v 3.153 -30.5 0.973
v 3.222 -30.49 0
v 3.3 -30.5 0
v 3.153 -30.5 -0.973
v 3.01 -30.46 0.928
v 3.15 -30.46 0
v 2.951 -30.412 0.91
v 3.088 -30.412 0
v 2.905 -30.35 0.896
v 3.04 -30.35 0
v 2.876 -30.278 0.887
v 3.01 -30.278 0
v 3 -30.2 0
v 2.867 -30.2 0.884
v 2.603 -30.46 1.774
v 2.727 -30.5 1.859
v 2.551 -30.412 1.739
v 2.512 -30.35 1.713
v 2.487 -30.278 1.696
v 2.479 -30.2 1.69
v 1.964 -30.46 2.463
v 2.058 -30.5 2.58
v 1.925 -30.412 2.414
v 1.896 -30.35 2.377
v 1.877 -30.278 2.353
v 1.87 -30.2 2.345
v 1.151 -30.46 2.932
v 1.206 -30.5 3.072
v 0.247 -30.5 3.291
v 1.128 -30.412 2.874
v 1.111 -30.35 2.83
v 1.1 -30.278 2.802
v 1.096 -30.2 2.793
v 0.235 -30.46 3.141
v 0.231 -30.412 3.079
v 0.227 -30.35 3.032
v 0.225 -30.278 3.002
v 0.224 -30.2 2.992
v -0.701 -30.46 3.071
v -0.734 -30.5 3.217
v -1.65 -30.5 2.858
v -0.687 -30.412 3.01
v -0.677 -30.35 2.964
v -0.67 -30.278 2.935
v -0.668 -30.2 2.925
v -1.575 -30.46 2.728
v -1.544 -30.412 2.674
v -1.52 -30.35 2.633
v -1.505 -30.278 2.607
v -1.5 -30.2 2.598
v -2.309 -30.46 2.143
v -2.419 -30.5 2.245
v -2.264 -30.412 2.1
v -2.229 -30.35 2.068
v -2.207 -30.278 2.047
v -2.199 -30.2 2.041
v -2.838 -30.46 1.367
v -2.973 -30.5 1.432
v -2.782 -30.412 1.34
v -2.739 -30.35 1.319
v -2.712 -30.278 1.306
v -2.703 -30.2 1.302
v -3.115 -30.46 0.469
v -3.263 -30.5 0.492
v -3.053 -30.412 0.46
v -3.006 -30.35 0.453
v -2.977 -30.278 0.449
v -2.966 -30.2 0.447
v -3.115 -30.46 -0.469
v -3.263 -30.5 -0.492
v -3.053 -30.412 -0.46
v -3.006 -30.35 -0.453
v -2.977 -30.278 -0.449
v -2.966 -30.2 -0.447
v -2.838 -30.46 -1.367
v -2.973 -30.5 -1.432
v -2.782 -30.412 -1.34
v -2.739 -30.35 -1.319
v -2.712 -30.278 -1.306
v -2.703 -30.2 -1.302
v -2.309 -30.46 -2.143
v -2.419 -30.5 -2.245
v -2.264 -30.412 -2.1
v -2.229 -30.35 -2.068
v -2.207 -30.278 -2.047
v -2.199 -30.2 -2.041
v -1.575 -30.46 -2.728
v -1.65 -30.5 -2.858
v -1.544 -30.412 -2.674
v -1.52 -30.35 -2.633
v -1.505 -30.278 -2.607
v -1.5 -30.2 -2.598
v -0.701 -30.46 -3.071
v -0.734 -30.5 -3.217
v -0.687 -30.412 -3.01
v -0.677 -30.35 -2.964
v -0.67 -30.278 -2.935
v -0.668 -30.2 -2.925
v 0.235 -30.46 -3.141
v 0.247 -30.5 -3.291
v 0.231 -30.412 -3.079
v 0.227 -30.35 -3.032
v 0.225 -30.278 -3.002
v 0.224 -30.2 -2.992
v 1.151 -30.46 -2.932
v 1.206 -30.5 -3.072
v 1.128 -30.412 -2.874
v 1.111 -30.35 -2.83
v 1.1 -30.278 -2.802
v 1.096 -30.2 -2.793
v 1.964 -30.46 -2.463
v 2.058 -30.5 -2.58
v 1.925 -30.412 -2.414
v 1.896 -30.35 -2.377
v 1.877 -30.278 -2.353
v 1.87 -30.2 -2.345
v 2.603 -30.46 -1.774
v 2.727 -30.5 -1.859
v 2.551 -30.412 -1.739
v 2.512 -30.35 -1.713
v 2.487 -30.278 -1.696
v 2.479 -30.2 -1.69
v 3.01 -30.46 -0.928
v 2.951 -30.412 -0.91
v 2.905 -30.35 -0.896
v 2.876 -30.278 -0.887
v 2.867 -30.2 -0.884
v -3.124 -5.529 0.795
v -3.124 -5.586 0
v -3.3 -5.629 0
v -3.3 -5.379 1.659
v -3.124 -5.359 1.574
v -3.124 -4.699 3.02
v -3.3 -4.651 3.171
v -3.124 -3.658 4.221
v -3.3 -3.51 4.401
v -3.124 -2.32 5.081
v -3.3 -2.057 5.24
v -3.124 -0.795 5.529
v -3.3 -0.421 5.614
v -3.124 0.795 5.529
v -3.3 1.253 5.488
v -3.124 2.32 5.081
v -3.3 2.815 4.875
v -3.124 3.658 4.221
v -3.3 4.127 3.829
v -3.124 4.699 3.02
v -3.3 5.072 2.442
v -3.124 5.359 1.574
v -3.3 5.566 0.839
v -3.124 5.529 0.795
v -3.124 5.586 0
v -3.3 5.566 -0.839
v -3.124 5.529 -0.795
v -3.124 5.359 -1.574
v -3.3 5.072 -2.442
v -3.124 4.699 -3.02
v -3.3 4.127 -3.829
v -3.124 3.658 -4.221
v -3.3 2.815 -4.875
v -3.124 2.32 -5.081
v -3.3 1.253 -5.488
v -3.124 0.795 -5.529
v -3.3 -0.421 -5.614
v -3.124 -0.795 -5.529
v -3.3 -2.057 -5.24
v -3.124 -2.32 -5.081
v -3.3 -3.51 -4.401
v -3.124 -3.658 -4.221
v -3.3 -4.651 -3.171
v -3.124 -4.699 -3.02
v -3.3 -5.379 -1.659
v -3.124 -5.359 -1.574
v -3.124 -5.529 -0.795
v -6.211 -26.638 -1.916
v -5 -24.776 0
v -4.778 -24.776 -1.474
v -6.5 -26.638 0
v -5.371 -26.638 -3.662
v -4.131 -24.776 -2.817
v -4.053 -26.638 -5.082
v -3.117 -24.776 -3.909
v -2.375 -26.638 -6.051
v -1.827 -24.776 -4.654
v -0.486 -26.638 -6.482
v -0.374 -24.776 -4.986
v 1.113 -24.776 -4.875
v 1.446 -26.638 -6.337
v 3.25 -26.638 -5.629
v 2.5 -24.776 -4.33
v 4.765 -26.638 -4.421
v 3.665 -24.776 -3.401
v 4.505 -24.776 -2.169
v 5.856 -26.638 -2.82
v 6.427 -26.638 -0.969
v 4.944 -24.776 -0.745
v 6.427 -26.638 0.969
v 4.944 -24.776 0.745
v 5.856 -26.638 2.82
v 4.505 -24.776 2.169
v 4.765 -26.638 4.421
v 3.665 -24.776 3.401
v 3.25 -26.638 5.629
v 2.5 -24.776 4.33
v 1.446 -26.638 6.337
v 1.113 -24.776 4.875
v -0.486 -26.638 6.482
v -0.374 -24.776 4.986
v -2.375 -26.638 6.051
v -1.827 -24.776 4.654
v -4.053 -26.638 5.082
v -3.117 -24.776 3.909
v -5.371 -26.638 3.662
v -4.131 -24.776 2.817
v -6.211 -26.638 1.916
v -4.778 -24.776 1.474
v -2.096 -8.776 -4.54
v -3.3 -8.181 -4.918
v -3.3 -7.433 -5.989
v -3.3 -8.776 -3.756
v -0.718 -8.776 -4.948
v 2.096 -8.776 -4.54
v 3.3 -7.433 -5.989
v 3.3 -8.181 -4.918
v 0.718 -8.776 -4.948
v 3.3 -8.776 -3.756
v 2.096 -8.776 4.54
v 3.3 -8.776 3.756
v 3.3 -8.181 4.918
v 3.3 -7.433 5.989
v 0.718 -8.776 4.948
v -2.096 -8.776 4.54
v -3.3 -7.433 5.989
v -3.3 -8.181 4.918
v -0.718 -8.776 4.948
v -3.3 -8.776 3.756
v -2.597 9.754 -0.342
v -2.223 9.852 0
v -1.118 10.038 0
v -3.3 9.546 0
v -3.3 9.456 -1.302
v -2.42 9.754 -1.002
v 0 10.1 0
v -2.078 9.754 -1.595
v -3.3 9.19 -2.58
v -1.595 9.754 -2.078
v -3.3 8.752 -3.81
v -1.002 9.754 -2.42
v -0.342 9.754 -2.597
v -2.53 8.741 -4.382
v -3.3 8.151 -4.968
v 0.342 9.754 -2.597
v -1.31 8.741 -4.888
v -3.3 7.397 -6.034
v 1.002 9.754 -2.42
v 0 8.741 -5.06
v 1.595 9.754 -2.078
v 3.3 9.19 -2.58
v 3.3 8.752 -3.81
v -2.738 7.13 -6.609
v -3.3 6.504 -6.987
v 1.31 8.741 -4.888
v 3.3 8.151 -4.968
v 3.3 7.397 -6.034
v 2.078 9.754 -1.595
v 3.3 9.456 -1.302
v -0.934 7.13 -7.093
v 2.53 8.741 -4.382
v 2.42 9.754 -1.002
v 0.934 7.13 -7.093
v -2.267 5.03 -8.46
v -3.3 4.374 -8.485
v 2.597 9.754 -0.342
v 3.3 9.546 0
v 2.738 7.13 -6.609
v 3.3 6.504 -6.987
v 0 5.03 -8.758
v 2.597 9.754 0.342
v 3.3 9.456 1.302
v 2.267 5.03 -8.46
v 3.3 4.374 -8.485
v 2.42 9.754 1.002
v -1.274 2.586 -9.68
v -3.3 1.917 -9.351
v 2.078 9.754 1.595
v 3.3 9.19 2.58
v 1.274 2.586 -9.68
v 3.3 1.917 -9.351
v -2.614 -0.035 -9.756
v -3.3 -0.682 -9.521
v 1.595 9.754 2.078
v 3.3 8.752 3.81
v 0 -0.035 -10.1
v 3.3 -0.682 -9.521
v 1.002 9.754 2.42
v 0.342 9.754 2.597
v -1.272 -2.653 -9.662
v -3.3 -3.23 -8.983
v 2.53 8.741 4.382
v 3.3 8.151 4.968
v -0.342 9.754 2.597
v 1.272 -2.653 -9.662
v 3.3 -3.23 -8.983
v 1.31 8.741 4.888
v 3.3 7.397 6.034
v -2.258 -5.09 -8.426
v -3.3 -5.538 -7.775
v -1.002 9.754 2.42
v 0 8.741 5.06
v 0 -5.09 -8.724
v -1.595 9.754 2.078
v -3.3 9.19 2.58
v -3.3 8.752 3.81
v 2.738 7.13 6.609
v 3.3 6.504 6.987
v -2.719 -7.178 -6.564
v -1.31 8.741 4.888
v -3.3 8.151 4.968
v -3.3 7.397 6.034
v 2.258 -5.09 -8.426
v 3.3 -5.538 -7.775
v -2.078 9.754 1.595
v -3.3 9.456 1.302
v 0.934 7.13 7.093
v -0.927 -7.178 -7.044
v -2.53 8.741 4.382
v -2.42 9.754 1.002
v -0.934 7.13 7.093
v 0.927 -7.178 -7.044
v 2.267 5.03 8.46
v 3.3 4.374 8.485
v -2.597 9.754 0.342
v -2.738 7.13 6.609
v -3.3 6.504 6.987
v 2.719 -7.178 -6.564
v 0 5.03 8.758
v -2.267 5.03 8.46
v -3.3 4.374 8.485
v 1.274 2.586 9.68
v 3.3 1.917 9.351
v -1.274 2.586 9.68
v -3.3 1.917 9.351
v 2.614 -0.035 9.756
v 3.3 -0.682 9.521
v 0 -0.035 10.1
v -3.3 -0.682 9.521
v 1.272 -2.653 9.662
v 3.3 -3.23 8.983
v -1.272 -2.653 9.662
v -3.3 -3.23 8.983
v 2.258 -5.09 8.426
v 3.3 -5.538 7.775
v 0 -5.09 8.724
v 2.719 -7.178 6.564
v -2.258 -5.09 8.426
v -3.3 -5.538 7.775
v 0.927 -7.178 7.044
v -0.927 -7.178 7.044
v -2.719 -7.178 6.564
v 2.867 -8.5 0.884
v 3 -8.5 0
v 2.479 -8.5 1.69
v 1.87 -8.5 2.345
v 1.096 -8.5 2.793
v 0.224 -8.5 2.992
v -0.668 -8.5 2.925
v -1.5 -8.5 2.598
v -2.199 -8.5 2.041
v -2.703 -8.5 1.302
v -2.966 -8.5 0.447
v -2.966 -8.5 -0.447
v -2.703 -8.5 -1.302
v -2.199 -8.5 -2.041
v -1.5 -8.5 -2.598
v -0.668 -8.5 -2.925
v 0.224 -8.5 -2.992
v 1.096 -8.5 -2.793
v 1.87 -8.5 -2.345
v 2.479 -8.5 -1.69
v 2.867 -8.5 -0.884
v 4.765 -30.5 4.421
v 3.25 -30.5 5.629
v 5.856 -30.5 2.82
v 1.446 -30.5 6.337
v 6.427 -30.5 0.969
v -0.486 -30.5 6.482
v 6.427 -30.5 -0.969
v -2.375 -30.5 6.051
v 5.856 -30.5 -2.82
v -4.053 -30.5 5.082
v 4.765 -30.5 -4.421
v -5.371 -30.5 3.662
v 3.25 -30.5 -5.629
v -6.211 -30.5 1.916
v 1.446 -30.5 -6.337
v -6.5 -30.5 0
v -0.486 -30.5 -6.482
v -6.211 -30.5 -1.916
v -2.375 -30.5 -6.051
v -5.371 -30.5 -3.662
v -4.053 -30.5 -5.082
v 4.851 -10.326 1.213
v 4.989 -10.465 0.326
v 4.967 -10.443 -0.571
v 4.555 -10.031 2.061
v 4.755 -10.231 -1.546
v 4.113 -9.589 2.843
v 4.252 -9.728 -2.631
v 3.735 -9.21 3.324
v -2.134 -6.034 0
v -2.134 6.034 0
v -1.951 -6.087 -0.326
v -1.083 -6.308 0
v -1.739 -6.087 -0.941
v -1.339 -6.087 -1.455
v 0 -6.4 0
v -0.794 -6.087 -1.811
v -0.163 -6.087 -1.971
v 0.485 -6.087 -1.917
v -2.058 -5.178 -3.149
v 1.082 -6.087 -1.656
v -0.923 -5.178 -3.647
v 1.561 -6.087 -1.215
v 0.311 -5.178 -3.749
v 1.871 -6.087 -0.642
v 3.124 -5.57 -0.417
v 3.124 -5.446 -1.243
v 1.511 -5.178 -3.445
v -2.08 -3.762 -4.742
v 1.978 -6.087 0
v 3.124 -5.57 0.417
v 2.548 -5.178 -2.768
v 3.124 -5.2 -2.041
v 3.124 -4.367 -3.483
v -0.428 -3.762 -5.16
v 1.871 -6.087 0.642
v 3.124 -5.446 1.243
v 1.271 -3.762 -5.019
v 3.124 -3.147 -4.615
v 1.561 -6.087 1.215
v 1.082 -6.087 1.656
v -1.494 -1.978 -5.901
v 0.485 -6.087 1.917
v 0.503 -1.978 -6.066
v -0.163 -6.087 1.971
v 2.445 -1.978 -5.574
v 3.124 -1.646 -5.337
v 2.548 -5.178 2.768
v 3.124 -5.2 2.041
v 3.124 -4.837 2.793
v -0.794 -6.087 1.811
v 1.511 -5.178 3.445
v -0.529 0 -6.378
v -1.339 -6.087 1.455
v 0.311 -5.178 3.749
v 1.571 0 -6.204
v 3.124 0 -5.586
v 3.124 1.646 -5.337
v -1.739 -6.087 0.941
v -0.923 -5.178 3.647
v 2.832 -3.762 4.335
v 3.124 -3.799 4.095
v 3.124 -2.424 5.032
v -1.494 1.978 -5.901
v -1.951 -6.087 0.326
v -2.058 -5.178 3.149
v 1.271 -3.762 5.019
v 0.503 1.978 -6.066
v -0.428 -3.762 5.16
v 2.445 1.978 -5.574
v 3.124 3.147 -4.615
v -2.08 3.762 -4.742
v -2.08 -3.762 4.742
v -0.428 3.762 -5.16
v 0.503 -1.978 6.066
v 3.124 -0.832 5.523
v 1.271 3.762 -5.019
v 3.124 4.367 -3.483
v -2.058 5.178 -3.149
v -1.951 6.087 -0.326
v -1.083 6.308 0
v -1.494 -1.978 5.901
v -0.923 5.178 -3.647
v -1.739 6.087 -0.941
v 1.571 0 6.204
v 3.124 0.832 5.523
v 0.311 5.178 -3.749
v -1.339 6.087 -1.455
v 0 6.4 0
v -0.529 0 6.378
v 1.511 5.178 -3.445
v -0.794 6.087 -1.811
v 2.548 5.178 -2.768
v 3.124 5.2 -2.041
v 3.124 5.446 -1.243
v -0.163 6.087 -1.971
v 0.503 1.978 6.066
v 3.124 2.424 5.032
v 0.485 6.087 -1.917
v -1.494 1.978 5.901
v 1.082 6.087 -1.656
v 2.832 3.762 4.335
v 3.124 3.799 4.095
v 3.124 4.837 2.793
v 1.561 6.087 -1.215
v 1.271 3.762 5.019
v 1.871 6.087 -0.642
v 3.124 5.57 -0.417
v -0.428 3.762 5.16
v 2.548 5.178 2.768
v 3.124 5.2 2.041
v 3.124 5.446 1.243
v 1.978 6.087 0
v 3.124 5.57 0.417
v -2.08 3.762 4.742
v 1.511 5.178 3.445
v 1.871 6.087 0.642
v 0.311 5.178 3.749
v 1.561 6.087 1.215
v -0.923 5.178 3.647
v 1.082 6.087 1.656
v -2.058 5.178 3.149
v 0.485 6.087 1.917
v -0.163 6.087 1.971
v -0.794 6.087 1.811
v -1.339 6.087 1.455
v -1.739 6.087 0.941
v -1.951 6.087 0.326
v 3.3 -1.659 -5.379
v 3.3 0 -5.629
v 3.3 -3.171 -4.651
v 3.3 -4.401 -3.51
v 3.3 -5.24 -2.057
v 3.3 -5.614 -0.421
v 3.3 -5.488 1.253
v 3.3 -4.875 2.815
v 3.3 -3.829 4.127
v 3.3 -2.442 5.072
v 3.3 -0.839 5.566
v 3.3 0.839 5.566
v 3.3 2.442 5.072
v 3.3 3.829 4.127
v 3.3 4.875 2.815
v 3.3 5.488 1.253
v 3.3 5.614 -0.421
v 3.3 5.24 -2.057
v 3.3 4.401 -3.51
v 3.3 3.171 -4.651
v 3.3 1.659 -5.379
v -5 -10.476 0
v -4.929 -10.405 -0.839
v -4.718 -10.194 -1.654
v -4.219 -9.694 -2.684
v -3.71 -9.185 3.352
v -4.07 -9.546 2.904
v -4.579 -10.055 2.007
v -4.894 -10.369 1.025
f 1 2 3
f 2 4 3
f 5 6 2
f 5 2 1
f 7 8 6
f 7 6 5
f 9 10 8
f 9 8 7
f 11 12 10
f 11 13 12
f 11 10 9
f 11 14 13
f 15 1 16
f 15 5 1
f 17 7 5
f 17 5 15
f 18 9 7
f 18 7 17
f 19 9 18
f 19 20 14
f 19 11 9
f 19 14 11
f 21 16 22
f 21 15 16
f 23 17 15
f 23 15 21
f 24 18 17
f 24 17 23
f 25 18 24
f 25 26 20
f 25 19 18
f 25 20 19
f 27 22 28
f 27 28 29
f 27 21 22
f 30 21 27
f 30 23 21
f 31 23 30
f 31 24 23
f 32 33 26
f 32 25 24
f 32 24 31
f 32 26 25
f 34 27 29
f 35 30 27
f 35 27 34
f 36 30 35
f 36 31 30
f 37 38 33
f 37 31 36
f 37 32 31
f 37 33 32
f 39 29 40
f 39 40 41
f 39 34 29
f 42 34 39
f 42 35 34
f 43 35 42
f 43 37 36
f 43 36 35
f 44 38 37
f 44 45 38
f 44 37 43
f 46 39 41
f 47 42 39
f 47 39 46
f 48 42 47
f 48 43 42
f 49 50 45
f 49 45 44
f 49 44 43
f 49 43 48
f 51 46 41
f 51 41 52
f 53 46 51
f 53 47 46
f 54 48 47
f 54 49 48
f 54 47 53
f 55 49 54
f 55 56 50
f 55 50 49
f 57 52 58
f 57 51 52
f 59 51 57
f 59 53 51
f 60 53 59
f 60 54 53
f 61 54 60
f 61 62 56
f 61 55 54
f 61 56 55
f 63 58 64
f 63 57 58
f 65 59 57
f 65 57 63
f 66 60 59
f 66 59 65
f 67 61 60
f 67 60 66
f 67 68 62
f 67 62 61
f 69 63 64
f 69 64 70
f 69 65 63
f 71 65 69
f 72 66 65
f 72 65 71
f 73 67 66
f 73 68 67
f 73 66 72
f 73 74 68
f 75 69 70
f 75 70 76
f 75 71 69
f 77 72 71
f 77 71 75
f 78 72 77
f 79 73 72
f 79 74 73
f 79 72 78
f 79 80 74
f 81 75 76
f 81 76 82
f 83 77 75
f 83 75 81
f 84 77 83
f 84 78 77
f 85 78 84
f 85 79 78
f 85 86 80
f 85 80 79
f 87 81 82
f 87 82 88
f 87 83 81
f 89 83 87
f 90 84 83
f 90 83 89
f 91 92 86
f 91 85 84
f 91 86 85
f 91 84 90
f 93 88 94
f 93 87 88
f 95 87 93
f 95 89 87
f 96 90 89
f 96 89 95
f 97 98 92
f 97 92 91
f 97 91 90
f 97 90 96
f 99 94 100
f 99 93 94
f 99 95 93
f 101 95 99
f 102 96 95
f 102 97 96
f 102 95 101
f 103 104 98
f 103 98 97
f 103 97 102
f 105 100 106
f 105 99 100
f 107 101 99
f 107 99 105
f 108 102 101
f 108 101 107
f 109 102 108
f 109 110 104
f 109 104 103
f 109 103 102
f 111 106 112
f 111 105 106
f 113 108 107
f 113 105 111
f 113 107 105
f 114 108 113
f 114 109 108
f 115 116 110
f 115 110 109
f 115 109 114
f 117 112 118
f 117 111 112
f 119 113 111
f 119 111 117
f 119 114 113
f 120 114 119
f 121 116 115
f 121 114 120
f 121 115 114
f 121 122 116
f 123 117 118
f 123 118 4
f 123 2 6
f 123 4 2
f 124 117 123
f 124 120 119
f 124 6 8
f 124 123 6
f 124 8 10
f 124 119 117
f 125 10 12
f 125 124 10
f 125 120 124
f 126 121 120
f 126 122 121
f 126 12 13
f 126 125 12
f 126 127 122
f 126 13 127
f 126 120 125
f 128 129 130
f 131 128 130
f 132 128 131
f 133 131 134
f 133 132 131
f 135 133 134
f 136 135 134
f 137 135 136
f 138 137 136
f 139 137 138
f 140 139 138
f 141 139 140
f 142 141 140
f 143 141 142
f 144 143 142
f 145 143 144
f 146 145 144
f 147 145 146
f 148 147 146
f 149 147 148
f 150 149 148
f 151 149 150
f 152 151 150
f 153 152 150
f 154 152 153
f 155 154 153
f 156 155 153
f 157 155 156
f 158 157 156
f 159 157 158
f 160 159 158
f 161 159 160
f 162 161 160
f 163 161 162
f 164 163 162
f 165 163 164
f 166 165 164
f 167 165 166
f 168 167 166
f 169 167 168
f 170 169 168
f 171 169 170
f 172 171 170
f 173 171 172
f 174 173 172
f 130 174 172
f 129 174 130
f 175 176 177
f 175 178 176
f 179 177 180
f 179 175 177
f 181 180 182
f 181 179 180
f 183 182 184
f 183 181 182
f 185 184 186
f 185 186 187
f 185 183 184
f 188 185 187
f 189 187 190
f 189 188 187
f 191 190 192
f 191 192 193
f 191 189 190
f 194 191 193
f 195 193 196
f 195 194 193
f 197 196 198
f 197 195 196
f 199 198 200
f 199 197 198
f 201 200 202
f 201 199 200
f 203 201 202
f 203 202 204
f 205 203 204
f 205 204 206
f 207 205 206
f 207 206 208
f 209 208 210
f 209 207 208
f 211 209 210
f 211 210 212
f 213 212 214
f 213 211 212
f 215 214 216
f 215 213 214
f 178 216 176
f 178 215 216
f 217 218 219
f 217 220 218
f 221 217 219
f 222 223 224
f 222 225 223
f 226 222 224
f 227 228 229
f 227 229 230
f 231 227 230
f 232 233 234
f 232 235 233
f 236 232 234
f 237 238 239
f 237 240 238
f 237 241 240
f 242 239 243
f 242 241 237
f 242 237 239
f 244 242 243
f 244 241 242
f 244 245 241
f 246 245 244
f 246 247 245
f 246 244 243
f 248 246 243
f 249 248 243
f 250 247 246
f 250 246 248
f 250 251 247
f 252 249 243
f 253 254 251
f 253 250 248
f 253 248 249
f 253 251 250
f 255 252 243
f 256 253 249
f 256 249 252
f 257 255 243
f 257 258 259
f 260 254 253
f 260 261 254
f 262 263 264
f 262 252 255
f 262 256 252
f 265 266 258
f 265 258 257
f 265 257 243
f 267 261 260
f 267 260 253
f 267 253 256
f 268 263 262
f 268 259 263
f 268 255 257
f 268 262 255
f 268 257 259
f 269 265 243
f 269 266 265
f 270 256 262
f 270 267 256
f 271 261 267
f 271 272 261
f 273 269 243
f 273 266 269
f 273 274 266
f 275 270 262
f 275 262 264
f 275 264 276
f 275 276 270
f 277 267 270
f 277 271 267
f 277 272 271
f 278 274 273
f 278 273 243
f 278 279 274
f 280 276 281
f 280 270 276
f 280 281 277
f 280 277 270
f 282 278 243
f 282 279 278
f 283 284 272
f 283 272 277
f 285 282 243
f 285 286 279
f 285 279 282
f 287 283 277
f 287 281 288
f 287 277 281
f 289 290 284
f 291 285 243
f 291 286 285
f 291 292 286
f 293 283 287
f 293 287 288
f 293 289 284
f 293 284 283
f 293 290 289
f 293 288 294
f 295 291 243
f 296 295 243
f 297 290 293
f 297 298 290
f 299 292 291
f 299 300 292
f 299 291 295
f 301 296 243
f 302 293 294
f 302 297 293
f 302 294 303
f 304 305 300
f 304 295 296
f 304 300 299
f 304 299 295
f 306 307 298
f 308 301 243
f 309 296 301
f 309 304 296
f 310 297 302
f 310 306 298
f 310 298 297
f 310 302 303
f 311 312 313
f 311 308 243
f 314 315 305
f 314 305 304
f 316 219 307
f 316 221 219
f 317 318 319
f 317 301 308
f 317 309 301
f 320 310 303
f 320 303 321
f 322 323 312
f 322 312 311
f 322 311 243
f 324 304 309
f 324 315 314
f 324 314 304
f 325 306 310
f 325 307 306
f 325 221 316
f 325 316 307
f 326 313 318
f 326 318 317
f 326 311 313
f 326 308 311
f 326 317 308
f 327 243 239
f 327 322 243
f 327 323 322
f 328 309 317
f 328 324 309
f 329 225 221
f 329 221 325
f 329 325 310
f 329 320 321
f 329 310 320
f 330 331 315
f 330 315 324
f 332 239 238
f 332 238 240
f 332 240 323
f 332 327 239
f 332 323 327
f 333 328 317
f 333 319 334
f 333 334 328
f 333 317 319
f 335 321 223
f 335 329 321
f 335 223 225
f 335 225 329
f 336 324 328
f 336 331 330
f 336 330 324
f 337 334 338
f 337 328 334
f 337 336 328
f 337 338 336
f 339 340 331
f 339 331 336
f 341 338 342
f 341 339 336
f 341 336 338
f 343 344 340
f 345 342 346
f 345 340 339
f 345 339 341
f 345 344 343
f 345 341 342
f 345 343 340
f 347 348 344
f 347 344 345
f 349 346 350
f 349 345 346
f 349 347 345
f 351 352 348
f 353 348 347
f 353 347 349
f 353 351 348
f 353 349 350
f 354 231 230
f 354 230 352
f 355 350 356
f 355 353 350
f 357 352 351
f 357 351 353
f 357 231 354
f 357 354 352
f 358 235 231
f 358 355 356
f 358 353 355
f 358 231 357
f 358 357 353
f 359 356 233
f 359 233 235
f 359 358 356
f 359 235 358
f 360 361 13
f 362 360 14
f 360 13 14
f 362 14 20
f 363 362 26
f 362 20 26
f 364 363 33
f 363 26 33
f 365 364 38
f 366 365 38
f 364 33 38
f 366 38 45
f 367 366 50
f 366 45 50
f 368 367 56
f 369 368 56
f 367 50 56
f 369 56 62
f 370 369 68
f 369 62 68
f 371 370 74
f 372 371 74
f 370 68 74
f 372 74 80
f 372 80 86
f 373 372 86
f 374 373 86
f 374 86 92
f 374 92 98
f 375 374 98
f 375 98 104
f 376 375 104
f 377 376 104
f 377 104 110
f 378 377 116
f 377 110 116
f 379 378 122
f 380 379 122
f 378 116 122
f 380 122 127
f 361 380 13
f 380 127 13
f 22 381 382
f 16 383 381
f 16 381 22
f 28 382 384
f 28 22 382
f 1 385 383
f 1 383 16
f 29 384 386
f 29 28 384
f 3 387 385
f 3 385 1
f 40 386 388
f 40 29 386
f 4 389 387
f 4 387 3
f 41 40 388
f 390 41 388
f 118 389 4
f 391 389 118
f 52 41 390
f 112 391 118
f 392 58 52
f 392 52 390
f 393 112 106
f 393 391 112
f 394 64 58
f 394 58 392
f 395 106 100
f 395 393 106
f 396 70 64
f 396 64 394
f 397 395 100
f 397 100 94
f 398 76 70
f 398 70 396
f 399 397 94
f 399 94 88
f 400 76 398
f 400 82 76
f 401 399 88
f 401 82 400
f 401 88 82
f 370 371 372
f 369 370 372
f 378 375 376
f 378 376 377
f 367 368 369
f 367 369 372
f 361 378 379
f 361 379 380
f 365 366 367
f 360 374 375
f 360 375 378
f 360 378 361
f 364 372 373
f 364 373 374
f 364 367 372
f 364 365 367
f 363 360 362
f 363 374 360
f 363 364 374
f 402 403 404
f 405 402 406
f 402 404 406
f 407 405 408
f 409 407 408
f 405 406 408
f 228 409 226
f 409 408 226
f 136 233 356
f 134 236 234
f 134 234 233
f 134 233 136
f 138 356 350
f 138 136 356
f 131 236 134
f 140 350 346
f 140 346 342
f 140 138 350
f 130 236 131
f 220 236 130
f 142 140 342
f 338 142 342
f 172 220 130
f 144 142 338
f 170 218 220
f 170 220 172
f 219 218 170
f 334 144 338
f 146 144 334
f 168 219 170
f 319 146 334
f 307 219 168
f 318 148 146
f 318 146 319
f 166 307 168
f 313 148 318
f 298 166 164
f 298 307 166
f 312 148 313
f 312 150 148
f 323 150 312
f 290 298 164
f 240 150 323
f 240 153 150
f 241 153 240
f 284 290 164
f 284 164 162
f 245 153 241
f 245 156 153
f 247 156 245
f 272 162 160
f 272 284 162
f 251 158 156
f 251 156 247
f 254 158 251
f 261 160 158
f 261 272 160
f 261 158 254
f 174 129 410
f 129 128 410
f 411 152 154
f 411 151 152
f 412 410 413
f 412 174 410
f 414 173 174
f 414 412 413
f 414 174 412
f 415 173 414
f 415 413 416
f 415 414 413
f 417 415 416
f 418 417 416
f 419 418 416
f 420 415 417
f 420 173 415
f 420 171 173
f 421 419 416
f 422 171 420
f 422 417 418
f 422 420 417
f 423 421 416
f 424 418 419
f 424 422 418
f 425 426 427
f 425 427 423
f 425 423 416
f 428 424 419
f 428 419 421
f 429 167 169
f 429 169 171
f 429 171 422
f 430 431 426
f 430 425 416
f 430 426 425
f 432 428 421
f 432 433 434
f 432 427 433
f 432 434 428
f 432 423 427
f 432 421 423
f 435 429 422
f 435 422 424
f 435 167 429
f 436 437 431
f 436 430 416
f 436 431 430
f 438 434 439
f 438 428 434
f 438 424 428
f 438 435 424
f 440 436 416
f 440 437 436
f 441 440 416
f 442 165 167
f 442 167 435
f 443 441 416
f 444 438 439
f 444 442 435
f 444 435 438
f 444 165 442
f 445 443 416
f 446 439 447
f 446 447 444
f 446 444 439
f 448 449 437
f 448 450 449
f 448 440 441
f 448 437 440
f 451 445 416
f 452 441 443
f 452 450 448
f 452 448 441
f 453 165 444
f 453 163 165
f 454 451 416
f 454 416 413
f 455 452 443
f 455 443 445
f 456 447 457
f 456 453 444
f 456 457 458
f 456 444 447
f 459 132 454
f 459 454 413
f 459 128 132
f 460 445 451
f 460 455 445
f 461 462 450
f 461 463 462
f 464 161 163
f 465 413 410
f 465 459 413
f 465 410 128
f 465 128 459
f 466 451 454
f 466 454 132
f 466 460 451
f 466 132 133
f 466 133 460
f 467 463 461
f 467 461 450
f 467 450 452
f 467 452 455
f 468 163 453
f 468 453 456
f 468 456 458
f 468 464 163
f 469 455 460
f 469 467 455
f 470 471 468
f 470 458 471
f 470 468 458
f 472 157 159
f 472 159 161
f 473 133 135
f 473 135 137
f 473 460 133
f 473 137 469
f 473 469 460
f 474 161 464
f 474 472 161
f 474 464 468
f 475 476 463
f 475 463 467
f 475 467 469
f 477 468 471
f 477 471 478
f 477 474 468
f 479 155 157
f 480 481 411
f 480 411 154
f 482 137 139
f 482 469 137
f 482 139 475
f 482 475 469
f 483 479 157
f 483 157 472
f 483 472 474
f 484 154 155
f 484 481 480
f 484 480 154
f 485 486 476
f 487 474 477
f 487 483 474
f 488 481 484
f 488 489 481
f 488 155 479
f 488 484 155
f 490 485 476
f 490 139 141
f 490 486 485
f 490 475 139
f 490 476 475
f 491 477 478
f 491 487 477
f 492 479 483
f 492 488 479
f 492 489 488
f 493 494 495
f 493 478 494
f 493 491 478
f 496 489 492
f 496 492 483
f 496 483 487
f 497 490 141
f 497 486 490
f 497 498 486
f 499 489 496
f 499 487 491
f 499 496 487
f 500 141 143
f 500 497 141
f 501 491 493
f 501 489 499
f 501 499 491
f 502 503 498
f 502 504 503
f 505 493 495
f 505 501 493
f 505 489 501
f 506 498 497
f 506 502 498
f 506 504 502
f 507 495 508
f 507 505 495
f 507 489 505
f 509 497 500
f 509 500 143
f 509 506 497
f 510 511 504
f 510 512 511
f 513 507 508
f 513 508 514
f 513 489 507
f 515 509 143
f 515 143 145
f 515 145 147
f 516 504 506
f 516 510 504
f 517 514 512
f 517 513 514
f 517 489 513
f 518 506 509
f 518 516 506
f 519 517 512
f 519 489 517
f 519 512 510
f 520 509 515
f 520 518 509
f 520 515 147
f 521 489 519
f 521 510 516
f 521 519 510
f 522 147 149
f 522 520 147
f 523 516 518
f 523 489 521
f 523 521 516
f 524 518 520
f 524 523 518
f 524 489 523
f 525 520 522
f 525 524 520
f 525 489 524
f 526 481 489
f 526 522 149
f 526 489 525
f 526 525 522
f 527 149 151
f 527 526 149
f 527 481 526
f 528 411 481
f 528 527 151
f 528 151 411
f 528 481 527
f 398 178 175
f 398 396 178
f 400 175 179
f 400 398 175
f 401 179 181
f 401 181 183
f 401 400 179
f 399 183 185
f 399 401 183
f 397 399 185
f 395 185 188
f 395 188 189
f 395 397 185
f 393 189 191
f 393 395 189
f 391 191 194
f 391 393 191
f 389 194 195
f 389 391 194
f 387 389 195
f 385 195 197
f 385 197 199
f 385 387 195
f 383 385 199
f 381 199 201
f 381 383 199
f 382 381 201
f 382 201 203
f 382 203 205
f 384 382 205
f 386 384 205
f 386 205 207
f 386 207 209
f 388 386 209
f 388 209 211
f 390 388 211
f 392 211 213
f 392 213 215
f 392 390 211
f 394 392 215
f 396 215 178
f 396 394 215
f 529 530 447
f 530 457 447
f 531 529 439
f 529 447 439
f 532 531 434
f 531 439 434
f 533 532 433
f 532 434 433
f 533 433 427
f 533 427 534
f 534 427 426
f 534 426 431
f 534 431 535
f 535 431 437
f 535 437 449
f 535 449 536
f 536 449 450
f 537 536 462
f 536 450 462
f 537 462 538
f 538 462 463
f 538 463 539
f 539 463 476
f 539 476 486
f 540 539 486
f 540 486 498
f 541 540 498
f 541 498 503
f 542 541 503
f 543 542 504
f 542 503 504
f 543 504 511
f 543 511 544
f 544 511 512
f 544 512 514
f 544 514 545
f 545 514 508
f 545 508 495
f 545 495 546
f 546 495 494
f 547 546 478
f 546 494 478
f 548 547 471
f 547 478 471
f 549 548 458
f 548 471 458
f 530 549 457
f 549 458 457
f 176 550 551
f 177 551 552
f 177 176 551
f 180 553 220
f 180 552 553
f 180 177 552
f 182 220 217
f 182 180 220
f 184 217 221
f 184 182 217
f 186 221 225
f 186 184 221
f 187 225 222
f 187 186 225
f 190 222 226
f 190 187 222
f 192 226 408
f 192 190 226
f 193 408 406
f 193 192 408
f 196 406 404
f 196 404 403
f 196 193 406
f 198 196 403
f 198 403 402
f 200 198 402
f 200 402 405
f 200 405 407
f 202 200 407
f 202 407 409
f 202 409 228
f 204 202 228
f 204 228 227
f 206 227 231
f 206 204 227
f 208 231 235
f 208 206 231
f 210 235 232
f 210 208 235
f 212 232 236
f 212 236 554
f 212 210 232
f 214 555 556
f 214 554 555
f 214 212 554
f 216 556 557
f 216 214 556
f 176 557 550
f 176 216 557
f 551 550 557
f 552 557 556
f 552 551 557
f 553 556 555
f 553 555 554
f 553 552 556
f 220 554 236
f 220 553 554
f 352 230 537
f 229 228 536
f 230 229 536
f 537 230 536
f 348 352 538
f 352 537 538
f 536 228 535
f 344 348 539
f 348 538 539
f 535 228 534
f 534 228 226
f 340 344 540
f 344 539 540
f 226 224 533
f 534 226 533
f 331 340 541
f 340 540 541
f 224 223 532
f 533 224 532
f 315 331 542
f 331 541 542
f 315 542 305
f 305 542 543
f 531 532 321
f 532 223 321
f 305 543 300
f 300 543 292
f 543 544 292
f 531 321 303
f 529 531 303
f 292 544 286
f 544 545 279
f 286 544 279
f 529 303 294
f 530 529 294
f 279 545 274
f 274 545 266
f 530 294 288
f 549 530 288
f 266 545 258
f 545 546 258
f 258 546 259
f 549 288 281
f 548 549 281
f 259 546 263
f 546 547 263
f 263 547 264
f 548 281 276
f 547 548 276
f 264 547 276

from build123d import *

# Parameters (mm, degrees)
CORTAR_EXTRUIR1_DEPTH      = 34.678925161
CORTAR_EXTRUIR1_DEPTH_BACK = 34.678925161
CROQUIS5_R                 = 3
CORTAR_EXTRUIR3_DEPTH      = 22
REDONDEO5_R                = 0.3
CHAFL_N1_SIZE              = 0.145725928


with BuildPart() as part:
    # Croquis1 → Revolución1 (revolve)
    with BuildSketch(Plane.XY):
        with BuildLine():
            Line((-5, -8.775534172), (-5, -24.775534172))
            Line((-5, -24.775534172), (-6.5, -26.638122331))
            Line((-6.5, -26.638122331), (-6.5, -30.5))
            Line((-6.5, -30.5), (0, -30.5))
            Line((0, -30.5), (0, -6.4))
            ThreePointArc((0, -6.4), (-6.4, 0), (0, 6.4))
            Line((0, 6.4), (0, 10.1))
            ThreePointArc((0, 10.1), (-9.763270332, 2.586223585), (-5, -8.775534172))
        make_face()
    revolve(axis=Axis((0, -6.4, 0), (0, -1, 0)))

    # Croquis2 → Cortar-Extruir1 (cut, two sides: drawn at the far end of the back side and taken through both)
    with BuildSketch(Plane.XY.offset(-CORTAR_EXTRUIR1_DEPTH_BACK)):
        Polygon((6.3, -11.775534172), (3.3, -8.775534172), (3.3, 15.005915622), (11.326938796, 15.005915622), (10.720239286, -11.775534172), align=None)
        Polygon((-3.3, -8.775534172), (-3.3, 15.005915622), (-11.844039482, 15.005915622), (-11.844039482, -11.775534172), (-6.3, -11.775534172), align=None)
    extrude(amount=CORTAR_EXTRUIR1_DEPTH + CORTAR_EXTRUIR1_DEPTH_BACK, mode=Mode.SUBTRACT)

    # Croquis5 → Cortar-Extruir3 (cut)
    with BuildSketch(Plane.XZ.offset(30.5)):
        Circle(CROQUIS5_R)
    extrude(amount=-CORTAR_EXTRUIR3_DEPTH, mode=Mode.SUBTRACT)

    # Redondeo5
    redondeo5_edges = [part.edges().sort_by_distance(p)[0] for p in [
        (-3, -30.5, 0),
    ]]
    fillet(redondeo5_edges, radius=REDONDEO5_R)

    # Chaflán1
    # the kernel refuses this chamfer: 0.2, 0.145725928 mm, written as the material it takes off along each edge
    with BuildSketch(Plane(origin=(3.3, 0, 0), x_dir=(0, 0, -1), z_dir=(0, 1, 0))) as chafl_n1_piece_1:
        with BuildLine():
            Line((5.483611948 + CHAFL_N1_SIZE * 0.999999998153, 0), (5.585635764, 0.175792403))
            ThreePointArc((5.585635764, 0.175792403), (5.536764117, 0.089977708), (5.483611948, 0))
            Line((5.483611948, 0), (5.483611948 + CHAFL_N1_SIZE * 0.999999998153, 0))
        make_face()
    revolve(axis=Axis((3.3, 0, 0), (-1, 0, 0)), mode=Mode.SUBTRACT)
    with BuildSketch(Plane(origin=(-3.3, 0, 0), x_dir=(0, 1, 0), z_dir=(0, 0, 1))) as chafl_n1_piece_2:
        with BuildLine():
            Line((5.483611948 + CHAFL_N1_SIZE * 0.999999998153, 0), (5.585635764, -0.175792403))
            ThreePointArc((5.585635764, -0.175792403), (5.536764117, -0.089977708), (5.483611948, 0))
            Line((5.483611948, 0), (5.483611948 + CHAFL_N1_SIZE * 0.999999998153, 0))
        make_face()
    revolve(axis=Axis((-3.3, 0, 0), (-1, 0, 0)), revolution_arc=180, mode=Mode.SUBTRACT)
    with BuildSketch(Plane(origin=(-3.3, 0, 0), x_dir=(0, -1, 0), z_dir=(0, 0, -1))) as chafl_n1_piece_3:
        with BuildLine():
            Line((5.483611948 + CHAFL_N1_SIZE * 0.999999998153, 0), (5.585635764, -0.175792403))
            ThreePointArc((5.585635764, -0.175792403), (5.536764117, -0.089977708), (5.483611948, 0))
            Line((5.483611948, 0), (5.483611948 + CHAFL_N1_SIZE * 0.999999998153, 0))
        make_face()
    revolve(axis=Axis((-3.3, 0, 0), (-1, 0, 0)), revolution_arc=180, mode=Mode.SUBTRACT)


solid = part.part
